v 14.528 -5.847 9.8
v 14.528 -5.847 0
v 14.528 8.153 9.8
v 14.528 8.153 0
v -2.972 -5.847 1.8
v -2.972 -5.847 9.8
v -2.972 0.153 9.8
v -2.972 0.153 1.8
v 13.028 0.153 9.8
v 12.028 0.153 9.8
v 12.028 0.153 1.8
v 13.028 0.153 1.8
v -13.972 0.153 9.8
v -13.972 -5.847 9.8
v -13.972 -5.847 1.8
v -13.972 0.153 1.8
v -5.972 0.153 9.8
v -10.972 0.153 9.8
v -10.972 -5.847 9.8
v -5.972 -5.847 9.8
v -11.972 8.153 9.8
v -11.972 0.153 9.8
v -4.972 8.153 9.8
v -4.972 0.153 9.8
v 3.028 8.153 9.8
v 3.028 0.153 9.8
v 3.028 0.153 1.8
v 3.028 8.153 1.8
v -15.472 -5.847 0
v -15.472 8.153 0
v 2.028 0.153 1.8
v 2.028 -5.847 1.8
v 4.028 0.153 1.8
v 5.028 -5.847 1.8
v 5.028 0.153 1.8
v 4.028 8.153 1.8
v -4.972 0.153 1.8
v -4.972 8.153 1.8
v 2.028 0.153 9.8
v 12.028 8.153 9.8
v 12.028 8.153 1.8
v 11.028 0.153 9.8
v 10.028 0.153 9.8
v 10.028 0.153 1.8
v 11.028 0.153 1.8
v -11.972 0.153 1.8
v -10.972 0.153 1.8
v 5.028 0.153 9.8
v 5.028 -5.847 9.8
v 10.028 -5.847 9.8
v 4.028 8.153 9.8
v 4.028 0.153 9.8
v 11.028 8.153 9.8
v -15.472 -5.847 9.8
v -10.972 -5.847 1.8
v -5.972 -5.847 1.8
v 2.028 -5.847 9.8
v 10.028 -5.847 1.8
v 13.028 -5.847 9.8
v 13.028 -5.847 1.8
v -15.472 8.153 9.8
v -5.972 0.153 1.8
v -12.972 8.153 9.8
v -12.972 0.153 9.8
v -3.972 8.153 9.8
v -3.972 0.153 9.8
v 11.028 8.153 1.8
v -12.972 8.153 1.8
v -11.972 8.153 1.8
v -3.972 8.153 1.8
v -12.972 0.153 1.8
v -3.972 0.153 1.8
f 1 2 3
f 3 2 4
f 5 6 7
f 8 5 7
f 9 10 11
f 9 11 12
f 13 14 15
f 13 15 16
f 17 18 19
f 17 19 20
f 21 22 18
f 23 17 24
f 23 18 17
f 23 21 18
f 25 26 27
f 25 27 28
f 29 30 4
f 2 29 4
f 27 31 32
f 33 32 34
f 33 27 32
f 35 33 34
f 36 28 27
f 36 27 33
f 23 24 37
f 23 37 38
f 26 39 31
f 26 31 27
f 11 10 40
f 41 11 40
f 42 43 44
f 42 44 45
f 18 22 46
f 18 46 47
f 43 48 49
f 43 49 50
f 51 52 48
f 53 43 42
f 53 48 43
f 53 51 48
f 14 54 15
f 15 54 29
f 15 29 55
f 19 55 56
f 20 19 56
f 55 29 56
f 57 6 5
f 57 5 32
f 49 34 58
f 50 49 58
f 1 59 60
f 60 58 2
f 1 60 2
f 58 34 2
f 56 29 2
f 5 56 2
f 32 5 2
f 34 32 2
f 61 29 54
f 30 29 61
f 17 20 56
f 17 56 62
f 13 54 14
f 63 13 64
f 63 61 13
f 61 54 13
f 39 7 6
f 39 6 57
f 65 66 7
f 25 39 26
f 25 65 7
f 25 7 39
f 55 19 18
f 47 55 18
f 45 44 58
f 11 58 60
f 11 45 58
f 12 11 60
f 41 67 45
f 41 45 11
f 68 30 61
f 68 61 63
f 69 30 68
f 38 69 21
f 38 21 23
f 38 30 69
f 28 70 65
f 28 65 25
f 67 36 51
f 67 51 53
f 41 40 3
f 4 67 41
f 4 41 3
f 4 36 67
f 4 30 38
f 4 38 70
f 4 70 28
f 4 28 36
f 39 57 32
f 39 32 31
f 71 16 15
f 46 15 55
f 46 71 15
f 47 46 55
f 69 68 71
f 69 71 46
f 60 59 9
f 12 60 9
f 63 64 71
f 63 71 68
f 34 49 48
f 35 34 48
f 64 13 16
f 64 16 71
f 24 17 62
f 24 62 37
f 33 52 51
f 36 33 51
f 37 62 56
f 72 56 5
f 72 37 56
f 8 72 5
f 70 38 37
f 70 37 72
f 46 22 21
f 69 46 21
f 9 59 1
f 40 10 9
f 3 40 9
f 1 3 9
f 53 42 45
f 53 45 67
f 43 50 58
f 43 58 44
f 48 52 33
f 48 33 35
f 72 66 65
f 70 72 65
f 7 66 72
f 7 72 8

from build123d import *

# Parameters (mm, degrees)
F0_W     = 30
F0_H     = 14
F1_DEPTH = 9.8
F2_W     = 1
F2_H     = 14
F4_DEPTH = 8
F3_W     = 3
F3_H     = 6
F5_DEPTH = 8


with BuildPart() as f1:
    # F0 (on Top) → F1 (new body)
    with BuildSketch(Plane.XY):
        with Locations((-0.472123, 1.153064)):
            Rectangle(F0_W, F0_H)
    extrude(amount=F1_DEPTH)

    # F2 (on face) → F4 (cut)
    with BuildSketch(Plane.XY.offset(9.8)):
        with Locations((-12.472123, 1.153064)):
            Rectangle(F2_W, F2_H)
        with Locations((-4.472123, 1.153064)):
            Rectangle(F2_W, F2_H)
        with Locations((3.527877, 1.153064)):
            Rectangle(F2_W, F2_H)
        with Locations((11.527877, 1.153064)):
            Rectangle(F2_W, F2_H)
    extrude(amount=-F4_DEPTH, mode=Mode.SUBTRACT)

    # F3 (on face) → F5 (cut)
    with BuildSketch(Plane.XY.offset(9.8)):
        with Locations((-12.472123, -2.846936)):
            Rectangle(F3_W, F3_H)
        with Locations((-4.472123, -2.846936)):
            Rectangle(F3_W, F3_H)
        with Locations((3.527877, -2.846936)):
            Rectangle(F3_W, F3_H)
        with Locations((11.527877, -2.846936)):
            Rectangle(F3_W, F3_H)
    extrude(amount=-F5_DEPTH, mode=Mode.SUBTRACT)


solid = f1.part
